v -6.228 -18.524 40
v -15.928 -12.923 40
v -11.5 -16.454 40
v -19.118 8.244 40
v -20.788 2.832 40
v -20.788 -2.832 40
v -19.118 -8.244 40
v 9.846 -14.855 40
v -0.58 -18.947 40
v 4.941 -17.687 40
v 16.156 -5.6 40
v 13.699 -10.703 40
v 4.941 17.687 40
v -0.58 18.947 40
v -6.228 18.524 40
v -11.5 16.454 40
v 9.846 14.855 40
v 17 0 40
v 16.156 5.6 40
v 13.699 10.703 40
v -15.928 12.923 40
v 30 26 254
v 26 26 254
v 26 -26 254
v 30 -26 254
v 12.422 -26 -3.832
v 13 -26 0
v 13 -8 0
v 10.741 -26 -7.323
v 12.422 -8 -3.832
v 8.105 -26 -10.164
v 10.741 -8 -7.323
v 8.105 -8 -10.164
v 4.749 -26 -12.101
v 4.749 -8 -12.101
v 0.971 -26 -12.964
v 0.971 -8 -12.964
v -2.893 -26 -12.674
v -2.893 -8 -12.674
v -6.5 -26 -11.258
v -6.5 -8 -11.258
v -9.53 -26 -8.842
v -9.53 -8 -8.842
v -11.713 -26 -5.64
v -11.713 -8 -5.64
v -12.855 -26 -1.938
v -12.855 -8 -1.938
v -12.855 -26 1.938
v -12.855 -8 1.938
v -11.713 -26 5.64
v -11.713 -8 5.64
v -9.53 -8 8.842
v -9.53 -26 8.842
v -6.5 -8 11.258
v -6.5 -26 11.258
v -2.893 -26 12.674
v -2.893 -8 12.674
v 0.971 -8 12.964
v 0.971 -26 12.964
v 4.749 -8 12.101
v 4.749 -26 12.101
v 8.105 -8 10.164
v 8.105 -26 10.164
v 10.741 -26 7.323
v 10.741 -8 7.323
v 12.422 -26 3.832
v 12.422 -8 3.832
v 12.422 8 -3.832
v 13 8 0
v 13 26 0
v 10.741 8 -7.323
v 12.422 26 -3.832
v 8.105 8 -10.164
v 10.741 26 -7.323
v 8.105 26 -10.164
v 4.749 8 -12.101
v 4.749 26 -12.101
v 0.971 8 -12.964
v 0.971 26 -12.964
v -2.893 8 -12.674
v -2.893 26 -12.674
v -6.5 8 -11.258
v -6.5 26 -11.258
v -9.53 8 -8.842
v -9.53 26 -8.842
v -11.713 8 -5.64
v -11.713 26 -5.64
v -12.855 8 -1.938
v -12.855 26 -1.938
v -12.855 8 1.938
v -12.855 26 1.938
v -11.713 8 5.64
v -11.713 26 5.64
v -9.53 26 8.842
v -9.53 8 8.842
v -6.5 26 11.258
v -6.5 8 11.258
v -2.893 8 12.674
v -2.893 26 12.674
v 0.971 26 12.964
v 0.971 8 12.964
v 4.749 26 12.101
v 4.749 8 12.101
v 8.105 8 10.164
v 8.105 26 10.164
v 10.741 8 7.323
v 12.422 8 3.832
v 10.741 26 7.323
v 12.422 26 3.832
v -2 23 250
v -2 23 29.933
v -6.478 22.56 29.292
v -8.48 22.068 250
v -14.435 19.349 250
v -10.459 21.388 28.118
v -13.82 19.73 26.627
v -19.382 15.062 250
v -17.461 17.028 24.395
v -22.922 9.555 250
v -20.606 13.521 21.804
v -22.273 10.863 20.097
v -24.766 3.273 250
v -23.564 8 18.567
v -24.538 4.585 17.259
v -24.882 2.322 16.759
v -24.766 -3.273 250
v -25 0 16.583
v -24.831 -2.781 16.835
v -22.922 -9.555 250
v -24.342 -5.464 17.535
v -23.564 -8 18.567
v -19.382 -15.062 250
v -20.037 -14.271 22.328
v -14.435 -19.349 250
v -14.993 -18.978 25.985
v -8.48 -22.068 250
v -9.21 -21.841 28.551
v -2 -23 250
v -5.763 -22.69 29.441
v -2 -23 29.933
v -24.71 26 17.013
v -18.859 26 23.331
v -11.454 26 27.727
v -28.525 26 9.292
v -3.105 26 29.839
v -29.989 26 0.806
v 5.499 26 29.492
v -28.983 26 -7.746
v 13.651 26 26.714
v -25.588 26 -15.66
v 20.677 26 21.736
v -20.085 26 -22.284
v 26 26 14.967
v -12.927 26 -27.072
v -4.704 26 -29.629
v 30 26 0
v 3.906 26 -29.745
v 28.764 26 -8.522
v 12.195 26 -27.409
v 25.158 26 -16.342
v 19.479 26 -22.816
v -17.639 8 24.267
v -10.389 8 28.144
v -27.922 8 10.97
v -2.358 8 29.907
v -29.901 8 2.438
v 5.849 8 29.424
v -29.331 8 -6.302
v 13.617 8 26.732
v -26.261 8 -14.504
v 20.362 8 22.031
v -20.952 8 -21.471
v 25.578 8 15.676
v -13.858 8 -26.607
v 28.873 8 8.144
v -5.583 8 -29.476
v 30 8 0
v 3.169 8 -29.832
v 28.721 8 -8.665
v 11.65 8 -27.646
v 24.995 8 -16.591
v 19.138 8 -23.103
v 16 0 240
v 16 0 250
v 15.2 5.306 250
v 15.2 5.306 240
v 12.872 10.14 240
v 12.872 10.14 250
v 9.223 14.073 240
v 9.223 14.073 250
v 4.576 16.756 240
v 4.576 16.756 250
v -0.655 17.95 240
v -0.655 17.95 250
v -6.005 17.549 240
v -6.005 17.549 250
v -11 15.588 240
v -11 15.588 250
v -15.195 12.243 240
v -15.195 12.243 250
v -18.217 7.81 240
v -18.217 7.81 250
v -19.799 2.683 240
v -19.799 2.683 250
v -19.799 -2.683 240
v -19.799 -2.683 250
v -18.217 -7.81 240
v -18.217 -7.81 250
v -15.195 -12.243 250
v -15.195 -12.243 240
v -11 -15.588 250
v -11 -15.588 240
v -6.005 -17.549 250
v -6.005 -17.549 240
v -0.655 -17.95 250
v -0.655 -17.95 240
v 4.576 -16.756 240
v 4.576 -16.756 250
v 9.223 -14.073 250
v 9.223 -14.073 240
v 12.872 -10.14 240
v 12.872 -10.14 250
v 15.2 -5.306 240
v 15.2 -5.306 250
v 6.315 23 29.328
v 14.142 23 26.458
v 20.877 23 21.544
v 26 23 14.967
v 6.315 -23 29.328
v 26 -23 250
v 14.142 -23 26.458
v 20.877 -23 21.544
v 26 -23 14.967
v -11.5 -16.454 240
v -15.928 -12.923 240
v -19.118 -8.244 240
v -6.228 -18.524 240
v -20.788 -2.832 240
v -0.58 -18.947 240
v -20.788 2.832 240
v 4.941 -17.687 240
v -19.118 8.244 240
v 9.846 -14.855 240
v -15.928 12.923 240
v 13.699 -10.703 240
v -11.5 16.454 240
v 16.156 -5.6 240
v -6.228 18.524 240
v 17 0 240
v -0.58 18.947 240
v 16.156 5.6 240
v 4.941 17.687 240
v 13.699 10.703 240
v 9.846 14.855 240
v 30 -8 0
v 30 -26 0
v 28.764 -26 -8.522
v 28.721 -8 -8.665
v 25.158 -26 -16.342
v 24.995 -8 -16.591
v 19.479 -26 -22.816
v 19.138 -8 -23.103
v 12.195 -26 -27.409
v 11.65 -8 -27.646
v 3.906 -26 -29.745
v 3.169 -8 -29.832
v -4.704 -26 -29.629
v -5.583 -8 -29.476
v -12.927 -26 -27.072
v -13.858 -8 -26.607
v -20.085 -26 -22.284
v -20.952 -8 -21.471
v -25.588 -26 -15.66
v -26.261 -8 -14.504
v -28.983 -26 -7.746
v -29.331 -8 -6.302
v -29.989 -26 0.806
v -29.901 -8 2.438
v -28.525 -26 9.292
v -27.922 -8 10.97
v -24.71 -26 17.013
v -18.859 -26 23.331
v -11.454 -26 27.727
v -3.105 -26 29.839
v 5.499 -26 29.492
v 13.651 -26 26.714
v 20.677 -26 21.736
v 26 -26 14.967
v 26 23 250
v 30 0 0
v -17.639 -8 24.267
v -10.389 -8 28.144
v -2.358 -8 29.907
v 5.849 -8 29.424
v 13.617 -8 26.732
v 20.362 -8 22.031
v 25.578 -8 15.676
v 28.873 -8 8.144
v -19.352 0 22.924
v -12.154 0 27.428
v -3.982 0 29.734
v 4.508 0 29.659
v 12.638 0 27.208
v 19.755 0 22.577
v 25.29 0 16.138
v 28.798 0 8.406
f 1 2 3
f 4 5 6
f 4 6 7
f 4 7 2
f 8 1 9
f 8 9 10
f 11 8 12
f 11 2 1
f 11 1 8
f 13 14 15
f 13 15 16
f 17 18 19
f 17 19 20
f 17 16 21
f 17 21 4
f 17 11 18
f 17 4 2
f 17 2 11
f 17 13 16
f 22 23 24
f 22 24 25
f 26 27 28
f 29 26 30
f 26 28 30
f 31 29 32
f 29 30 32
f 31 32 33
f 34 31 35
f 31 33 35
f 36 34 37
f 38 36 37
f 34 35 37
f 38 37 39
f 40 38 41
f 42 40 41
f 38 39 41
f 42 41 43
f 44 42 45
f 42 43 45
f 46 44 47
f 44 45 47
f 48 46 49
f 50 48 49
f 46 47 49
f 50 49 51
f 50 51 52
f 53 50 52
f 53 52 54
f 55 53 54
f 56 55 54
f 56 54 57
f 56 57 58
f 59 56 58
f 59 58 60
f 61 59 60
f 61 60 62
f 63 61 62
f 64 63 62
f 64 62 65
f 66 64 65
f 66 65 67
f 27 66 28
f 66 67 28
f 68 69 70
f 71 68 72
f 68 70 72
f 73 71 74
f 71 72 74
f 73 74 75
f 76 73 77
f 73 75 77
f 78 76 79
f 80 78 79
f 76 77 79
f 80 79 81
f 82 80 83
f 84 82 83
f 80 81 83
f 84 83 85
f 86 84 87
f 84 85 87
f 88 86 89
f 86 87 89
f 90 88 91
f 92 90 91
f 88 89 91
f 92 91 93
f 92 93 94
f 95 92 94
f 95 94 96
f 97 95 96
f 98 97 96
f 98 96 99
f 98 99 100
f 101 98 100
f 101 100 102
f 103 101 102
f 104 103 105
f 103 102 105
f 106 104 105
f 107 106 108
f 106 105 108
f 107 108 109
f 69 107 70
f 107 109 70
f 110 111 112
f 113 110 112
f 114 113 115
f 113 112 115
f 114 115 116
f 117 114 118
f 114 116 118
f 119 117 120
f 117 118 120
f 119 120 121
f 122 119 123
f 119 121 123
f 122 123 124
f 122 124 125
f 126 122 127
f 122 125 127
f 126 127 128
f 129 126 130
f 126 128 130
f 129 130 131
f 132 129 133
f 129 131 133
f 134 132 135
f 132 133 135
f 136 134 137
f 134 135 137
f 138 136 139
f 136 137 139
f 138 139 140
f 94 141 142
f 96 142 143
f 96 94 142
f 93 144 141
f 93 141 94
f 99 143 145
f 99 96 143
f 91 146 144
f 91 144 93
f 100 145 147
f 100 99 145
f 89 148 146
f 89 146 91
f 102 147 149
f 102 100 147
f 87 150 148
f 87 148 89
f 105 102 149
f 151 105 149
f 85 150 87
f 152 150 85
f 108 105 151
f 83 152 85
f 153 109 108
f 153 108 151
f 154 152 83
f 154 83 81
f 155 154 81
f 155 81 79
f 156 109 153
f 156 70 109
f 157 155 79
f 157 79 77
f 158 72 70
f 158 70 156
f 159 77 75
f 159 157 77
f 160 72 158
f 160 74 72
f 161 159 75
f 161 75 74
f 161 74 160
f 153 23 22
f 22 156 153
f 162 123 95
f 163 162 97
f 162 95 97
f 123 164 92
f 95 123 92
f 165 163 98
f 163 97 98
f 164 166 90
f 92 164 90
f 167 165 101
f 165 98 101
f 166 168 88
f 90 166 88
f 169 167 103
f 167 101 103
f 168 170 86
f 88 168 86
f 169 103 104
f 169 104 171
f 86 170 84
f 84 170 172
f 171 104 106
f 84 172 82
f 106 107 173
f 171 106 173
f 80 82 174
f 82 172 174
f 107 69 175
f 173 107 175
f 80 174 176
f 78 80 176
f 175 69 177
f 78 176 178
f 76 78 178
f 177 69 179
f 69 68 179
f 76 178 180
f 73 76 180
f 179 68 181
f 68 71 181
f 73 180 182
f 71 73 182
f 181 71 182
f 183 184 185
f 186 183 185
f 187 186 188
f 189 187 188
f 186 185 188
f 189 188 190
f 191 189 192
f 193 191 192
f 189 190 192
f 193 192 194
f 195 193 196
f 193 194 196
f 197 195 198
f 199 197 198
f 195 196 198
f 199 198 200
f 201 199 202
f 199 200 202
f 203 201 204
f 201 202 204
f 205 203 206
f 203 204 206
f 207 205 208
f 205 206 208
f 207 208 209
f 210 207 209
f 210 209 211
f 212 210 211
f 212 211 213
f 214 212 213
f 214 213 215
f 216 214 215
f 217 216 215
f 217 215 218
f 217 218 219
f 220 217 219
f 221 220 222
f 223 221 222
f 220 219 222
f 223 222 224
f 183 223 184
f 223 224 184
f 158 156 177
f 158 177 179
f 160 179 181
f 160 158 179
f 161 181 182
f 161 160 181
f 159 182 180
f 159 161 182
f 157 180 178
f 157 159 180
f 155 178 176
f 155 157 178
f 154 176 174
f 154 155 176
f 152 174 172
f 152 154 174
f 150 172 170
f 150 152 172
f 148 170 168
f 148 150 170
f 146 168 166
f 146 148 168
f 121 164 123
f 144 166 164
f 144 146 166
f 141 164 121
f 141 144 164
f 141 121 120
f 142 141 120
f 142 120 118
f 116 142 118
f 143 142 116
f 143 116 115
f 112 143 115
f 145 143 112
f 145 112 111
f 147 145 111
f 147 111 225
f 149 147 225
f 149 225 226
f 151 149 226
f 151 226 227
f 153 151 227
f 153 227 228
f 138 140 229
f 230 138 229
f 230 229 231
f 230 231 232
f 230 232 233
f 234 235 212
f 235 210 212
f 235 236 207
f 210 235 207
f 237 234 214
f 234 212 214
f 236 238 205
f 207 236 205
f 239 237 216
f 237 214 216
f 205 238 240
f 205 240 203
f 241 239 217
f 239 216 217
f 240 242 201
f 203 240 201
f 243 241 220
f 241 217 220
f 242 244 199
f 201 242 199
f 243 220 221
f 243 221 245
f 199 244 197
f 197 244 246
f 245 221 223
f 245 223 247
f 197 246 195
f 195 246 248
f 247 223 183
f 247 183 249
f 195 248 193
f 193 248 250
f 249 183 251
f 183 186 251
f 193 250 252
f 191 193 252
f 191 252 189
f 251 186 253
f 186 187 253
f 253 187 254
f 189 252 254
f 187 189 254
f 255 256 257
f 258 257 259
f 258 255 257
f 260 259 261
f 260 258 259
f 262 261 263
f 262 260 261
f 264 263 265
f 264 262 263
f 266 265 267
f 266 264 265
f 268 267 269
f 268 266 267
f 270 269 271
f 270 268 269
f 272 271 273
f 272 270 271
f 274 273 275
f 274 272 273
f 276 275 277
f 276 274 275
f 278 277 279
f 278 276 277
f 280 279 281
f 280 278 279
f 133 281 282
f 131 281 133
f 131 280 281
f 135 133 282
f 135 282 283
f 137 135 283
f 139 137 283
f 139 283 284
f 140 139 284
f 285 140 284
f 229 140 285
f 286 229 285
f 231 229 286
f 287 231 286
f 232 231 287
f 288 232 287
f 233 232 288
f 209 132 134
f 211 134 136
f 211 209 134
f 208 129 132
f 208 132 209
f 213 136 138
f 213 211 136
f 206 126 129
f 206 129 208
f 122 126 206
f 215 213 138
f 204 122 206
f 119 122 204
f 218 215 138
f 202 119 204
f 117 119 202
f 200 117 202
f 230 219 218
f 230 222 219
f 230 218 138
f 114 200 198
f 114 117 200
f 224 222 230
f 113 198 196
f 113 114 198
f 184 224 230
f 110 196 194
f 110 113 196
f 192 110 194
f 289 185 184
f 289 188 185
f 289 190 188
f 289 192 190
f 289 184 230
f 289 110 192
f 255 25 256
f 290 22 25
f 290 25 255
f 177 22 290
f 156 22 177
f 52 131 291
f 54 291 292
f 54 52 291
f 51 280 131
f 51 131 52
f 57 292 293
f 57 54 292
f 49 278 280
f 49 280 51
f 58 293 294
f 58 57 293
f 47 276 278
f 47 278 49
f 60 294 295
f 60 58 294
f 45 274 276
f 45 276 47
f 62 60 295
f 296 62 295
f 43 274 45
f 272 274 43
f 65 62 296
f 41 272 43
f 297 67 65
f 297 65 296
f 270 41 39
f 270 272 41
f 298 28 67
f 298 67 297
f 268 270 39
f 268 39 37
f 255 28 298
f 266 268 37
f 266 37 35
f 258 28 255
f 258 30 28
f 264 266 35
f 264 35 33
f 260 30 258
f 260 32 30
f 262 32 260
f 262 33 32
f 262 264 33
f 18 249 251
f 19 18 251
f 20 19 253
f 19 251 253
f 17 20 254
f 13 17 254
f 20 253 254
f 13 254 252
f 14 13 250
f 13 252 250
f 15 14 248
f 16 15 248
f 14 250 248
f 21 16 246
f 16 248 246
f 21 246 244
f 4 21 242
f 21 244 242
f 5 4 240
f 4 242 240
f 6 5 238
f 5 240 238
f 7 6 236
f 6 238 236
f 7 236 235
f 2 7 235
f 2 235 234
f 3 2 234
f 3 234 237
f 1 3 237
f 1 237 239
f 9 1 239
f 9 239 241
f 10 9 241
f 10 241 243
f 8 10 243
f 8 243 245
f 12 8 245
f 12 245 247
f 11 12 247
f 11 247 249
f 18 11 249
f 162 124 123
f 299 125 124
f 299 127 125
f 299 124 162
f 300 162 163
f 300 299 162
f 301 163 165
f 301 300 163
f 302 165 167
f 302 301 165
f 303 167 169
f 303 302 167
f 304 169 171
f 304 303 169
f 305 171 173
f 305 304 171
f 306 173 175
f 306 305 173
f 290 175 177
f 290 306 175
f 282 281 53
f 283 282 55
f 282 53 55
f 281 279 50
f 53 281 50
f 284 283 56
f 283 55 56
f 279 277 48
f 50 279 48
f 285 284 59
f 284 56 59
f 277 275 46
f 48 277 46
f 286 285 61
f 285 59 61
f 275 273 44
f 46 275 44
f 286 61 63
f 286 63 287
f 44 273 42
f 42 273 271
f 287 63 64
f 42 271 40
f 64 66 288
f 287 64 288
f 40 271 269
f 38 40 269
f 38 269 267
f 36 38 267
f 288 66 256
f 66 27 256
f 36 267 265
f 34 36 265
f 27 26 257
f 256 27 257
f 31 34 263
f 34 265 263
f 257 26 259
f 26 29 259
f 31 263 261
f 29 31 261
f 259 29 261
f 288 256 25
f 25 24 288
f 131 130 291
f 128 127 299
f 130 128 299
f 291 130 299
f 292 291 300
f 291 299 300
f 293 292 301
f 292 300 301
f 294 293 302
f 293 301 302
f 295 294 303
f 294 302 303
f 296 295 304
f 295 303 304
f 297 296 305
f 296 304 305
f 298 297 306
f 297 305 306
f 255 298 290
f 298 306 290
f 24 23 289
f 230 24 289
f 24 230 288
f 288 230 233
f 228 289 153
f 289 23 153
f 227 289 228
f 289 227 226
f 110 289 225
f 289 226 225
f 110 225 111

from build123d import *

# Parameters (mm, degrees)
SKETCH1_R           = 30
BOSS_EXTRUDE1_DEPTH = 26
BOSS_EXTRUDE2_DEPTH = 250
SKETCH4_R           = 13
CUT_EXTRUDE2_DEPTH  = 26
SKETCH1_2_R         = 30
CUT_EXTRUDE3_DEPTH  = 8
CUT_EXTRUDE4_START  = 8
SKETCH1_3_R         = 30
CUT_EXTRUDE4_DEPTH  = 8
SKETCH5_R           = 19
CUT_EXTRUDE5_DEPTH  = 210
SKETCH7_W           = 4
SKETCH7_H           = 4
BOSS_EXTRUDE4_DEPTH = 26
SKETCH9_R           = 19
SKETCH9_R_2         = 18
BOSS_EXTRUDE5_DEPTH = 10


with BuildPart() as part:
    # Sketch1 → Boss-Extrude1 (new, symmetric)
    with BuildSketch(Plane(origin=(0, 0, 0), x_dir=(1, 0, 0), z_dir=(0, 1, 0))):
        Circle(SKETCH1_R)
    extrude(amount=BOSS_EXTRUDE1_DEPTH, both=True)

    # Sketch3 → Boss-Extrude2 (add)
    with BuildSketch(Plane.XY):
        with BuildLine():
            Line((26, 26), (26, 23))
            Line((26, 23), (-2, 23))
            ThreePointArc((-2, 23), (-25, 0), (-2, -23))
            Line((-2, -23), (26, -23))
            Line((26, -23), (26, -26))
            Line((26, -26), (30, -26))
            Line((30, -26), (30, 26))
            Line((30, 26), (26, 26))
        make_face()
    extrude(amount=BOSS_EXTRUDE2_DEPTH)

    # Sketch4 → Cut-Extrude2 (cut, symmetric)
    with BuildSketch(Plane(origin=(0, 0, 0), x_dir=(1, 0, 0), z_dir=(0, 1, 0))):
        Circle(SKETCH4_R)
    extrude(amount=CUT_EXTRUDE2_DEPTH, both=True, mode=Mode.SUBTRACT)

    # Sketch1<2> → Cut-Extrude3 (cut)
    with BuildSketch(Plane(origin=(0, 0, 0), x_dir=(1, 0, 0), z_dir=(0, 1, 0))):
        Circle(SKETCH1_2_R)
    extrude(amount=-CUT_EXTRUDE3_DEPTH, mode=Mode.SUBTRACT)

    # Sketch1<3> → Cut-Extrude4 (cut)
    with BuildSketch(Plane(origin=(0, 0, 0), x_dir=(1, 0, 0), z_dir=(0, 1, 0)).offset(CUT_EXTRUDE4_START)):
        Circle(SKETCH1_3_R)
    extrude(amount=-CUT_EXTRUDE4_DEPTH, mode=Mode.SUBTRACT)

    # Sketch5 → Cut-Extrude5 (cut)
    with BuildSketch(Plane.XY.offset(250)):
        with Locations((-2, 0)):
            Circle(SKETCH5_R)
    extrude(amount=-CUT_EXTRUDE5_DEPTH, mode=Mode.SUBTRACT)

    # Sketch7 → Boss-Extrude4 (add, symmetric)
    with BuildSketch(Plane(origin=(0, 0, 0), x_dir=(1, 0, 0), z_dir=(0, 1, 0))):
        with Locations((28, -252)):
            Rectangle(SKETCH7_W, SKETCH7_H)
    extrude(amount=BOSS_EXTRUDE4_DEPTH, both=True)

    # Sketch9 → Boss-Extrude5 (add)
    with BuildSketch(Plane.XY.offset(250)):
        with Locations((-2, 0)):
            Circle(SKETCH9_R)
        with Locations((-2, 0)):
            Circle(SKETCH9_R_2, mode=Mode.SUBTRACT)
    extrude(amount=-BOSS_EXTRUDE5_DEPTH)


solid = part.part
